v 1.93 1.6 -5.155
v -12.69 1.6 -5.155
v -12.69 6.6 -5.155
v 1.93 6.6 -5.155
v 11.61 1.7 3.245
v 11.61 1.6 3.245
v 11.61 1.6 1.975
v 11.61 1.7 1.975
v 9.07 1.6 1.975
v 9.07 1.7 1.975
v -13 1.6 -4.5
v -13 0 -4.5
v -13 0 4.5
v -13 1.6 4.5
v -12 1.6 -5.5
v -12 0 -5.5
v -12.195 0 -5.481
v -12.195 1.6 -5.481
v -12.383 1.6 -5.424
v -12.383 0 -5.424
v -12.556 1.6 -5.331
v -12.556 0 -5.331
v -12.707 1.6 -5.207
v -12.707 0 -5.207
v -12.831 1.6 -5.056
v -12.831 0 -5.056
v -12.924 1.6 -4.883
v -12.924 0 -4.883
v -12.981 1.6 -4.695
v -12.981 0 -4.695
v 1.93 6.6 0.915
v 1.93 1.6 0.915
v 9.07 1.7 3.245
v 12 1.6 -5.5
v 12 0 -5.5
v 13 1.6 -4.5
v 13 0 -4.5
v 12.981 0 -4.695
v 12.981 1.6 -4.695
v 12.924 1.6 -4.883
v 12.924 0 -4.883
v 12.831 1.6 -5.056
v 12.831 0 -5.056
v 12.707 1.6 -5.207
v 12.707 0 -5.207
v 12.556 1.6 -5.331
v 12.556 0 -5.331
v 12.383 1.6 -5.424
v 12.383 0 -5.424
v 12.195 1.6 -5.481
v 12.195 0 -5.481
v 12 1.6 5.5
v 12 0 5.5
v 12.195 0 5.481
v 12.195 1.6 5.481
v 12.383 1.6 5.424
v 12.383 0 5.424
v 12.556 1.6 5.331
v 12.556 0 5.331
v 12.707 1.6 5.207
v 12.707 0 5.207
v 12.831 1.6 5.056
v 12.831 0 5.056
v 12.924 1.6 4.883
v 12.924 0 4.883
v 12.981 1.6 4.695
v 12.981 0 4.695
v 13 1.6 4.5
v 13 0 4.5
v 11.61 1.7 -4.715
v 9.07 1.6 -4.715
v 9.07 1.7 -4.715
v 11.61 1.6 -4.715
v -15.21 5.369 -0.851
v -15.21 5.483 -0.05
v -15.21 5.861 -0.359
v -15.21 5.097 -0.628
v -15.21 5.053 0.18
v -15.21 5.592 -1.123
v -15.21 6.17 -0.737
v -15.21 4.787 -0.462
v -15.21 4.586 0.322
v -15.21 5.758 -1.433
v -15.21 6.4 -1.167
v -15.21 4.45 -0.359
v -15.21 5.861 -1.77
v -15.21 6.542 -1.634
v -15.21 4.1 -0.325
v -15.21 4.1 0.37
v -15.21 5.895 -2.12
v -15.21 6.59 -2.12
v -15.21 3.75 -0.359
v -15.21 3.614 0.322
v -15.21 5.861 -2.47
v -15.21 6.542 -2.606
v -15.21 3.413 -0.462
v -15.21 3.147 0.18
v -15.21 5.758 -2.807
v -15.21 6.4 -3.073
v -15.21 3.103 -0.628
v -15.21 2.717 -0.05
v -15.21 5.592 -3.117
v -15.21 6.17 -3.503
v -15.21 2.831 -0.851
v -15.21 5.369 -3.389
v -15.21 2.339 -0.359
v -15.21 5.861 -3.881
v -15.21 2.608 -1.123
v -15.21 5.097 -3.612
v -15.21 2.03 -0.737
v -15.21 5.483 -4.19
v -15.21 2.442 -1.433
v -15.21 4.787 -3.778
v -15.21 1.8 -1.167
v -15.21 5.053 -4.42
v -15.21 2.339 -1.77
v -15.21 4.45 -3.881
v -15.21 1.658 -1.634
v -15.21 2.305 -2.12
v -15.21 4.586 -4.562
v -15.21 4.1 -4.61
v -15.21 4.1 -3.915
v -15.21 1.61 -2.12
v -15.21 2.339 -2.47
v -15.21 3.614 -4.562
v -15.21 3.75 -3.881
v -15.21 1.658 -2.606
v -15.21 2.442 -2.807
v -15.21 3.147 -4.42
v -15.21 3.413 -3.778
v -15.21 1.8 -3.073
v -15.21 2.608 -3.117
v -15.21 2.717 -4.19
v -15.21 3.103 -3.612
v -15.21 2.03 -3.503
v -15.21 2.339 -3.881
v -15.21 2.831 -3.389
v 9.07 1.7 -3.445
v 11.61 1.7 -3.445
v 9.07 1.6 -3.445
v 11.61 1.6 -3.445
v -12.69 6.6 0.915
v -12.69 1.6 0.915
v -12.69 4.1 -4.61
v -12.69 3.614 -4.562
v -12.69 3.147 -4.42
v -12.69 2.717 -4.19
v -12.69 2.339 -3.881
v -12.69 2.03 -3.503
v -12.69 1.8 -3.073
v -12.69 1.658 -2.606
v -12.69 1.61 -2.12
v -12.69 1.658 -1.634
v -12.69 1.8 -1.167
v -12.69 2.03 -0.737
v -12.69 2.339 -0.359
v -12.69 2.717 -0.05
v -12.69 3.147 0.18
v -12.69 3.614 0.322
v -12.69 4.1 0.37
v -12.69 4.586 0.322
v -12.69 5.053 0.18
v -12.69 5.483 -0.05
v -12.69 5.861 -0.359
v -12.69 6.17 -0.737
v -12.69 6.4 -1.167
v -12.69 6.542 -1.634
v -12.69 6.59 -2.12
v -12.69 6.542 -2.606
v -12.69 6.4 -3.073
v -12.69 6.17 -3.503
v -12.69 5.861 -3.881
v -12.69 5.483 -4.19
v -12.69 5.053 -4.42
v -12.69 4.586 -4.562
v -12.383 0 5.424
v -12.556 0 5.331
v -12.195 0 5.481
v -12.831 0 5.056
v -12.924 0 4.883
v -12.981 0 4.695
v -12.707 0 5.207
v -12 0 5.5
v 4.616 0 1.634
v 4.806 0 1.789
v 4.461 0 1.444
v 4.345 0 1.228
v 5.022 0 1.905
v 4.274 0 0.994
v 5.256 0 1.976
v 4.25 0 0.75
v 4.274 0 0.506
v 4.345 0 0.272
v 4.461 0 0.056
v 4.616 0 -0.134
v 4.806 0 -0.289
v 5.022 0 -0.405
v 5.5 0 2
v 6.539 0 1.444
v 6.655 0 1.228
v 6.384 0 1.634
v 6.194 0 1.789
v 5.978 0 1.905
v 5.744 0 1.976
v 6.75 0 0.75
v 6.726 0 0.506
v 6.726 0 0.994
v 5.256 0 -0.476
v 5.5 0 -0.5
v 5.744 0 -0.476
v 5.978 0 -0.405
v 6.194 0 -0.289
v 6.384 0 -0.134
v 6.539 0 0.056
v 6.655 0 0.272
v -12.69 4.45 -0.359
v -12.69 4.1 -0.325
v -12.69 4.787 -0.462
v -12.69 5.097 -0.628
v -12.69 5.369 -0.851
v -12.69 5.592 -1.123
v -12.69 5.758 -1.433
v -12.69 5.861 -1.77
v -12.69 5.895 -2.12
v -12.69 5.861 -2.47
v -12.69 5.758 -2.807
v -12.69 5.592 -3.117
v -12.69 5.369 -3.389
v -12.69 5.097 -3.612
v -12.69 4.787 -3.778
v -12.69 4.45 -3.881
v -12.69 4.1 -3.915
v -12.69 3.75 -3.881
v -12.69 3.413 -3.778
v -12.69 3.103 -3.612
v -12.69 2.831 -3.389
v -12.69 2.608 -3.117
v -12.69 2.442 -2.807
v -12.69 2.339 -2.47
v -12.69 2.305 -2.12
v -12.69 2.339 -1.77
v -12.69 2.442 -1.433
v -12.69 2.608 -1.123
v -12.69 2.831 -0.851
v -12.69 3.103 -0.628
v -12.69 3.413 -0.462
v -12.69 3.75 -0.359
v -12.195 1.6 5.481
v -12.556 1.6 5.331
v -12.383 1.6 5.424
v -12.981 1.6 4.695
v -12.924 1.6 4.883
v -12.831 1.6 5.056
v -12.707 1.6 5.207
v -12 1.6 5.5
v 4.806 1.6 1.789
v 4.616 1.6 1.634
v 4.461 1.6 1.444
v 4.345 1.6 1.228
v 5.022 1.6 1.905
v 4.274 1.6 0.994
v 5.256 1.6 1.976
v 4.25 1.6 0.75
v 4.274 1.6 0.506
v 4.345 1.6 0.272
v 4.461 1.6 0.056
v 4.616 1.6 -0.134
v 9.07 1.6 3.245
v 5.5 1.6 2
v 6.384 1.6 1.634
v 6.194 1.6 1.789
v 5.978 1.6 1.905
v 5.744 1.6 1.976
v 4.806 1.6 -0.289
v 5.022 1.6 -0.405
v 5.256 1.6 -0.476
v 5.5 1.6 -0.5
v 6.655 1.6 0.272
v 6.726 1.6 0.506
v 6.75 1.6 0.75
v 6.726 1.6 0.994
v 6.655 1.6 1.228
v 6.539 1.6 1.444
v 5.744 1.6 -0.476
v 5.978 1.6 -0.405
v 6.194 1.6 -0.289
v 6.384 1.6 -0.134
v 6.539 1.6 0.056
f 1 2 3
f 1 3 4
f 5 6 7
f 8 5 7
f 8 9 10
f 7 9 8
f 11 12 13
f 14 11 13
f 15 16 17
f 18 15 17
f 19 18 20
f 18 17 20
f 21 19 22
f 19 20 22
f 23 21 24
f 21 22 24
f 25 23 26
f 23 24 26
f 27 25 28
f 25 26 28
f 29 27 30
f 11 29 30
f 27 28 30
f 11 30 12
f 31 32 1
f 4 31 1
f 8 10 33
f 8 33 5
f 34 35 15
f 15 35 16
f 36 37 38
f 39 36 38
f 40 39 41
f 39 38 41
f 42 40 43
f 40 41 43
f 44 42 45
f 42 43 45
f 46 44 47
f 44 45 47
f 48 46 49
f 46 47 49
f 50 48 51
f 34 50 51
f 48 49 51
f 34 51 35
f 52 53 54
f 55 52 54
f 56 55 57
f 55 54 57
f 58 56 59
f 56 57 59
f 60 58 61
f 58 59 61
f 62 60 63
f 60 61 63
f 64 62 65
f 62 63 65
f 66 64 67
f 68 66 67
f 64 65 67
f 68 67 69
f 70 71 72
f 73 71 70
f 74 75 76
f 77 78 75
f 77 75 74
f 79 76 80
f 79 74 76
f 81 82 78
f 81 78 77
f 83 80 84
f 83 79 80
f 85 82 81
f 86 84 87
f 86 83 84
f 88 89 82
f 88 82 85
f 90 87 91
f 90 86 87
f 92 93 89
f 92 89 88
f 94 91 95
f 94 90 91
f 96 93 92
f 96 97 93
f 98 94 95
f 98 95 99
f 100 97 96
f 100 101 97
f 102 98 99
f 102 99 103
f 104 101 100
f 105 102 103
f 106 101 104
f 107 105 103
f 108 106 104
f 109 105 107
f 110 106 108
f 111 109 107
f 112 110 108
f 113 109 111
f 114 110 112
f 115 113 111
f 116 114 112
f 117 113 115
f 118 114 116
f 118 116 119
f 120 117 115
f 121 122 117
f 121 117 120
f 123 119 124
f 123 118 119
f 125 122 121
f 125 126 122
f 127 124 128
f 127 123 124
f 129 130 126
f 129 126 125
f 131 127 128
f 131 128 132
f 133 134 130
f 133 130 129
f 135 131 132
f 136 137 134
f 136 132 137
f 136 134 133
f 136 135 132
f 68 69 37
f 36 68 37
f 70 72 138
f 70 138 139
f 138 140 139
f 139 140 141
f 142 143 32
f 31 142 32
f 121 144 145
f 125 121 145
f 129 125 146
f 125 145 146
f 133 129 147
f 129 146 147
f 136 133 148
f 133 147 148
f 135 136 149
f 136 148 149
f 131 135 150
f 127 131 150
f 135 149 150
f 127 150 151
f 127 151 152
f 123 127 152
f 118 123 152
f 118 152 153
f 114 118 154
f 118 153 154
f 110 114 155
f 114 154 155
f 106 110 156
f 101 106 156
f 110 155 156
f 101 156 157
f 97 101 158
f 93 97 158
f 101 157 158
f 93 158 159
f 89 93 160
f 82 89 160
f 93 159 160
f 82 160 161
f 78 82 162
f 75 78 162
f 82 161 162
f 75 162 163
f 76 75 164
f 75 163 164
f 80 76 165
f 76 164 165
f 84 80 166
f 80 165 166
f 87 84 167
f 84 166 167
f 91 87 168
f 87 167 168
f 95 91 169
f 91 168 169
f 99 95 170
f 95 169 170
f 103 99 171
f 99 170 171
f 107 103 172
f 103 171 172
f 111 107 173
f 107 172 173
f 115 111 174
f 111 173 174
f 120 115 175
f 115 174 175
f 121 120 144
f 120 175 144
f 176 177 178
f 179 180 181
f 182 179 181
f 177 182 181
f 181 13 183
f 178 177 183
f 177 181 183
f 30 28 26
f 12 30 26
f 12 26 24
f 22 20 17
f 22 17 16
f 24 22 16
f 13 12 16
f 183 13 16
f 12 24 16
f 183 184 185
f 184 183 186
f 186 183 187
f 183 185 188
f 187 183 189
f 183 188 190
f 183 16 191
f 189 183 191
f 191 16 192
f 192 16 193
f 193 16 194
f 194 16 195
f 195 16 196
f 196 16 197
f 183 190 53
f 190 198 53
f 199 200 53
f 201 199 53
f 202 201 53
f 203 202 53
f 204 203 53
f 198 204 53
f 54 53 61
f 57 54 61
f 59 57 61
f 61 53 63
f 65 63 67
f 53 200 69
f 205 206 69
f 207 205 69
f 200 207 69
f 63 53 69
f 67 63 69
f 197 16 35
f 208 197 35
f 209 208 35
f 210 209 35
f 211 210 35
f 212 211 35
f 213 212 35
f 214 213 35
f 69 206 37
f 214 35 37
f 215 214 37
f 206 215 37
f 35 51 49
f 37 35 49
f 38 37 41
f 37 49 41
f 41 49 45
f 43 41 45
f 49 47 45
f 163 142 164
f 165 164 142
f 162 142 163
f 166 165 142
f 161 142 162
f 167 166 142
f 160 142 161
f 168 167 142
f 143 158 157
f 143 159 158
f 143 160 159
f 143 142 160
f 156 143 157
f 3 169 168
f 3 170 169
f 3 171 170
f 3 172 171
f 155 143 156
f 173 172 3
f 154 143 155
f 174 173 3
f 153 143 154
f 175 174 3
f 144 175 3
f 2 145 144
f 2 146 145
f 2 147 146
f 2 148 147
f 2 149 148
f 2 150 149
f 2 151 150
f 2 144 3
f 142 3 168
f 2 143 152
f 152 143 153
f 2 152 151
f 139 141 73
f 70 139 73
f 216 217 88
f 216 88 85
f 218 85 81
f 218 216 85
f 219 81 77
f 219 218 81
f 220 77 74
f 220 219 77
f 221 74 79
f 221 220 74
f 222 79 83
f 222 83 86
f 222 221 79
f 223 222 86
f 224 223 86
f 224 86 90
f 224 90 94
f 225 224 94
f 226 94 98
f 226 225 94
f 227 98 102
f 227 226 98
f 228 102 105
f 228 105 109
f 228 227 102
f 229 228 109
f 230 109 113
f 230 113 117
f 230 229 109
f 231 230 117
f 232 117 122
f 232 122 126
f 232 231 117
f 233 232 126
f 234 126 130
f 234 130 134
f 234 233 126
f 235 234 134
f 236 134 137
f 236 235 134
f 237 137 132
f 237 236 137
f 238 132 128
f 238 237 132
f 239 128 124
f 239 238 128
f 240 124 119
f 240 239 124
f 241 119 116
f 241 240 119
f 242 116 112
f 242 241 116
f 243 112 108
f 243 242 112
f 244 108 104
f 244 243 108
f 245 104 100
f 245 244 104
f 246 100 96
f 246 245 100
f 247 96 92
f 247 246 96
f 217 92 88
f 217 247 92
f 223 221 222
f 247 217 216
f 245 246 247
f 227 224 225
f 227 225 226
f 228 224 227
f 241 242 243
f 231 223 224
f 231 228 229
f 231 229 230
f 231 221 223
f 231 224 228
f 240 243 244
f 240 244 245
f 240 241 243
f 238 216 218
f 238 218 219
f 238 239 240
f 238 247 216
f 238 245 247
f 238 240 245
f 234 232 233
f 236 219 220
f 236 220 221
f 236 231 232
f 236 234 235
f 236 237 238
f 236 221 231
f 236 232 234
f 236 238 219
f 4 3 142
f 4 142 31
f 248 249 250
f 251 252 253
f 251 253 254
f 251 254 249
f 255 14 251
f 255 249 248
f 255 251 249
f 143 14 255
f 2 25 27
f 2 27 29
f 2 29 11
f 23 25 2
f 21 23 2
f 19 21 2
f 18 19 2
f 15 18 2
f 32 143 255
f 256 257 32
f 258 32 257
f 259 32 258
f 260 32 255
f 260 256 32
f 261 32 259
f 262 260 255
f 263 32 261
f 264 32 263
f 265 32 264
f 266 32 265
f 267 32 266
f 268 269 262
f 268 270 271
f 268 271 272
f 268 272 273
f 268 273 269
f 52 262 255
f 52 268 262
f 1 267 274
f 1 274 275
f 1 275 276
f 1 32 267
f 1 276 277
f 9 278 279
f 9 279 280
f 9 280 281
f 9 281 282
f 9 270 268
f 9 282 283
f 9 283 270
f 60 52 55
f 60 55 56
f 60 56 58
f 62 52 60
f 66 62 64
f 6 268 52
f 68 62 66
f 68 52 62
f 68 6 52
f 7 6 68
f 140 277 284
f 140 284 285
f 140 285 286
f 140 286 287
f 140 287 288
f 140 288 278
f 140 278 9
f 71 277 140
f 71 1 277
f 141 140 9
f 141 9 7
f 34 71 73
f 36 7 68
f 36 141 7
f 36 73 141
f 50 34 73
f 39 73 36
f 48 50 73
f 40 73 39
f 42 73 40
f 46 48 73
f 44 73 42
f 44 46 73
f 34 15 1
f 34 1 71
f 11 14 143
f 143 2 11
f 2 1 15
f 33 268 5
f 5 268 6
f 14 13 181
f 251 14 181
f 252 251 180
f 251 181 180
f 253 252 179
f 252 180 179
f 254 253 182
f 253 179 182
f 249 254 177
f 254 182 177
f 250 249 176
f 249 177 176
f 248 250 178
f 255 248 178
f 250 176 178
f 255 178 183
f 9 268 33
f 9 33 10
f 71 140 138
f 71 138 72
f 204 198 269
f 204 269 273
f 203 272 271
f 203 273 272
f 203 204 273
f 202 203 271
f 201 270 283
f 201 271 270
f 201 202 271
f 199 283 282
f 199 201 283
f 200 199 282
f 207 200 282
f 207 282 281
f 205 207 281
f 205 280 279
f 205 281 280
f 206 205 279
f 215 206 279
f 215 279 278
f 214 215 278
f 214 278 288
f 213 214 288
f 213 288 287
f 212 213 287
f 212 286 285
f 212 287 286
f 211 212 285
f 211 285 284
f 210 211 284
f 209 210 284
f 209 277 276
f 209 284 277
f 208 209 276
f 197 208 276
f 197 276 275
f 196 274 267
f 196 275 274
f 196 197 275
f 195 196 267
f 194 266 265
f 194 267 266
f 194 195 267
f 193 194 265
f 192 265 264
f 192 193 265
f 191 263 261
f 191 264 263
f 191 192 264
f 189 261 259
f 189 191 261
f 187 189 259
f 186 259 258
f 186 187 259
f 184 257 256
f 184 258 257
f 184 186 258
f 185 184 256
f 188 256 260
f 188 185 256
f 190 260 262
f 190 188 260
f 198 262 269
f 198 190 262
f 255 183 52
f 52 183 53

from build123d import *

# Parameters (mm, degrees)
BOSS_EXTRUDE1_DEPTH     = 1.6
SKETCH2_W               = 2.54
SKETCH2_H               = 1.27
BOSS_EXTRUDE2_DEPTH     = 0.1
SKETCH3_W               = 14.62
SKETCH3_H               = 6.07
BOSS_EXTRUDE3_DEPTH     = 5
SKETCH4_R               = 2.49
SKETCH4_R_2             = 1.795
BOSS_EXTRUDE5_DEPTH     = 2.52
CUT_EXTRUDE1_DEPTH      = 17.929090348
CUT_EXTRUDE1_DEPTH_BACK = 17.929090348
SKETCH5_R               = 1.25


with BuildPart() as part:
    # Sketch1 → Boss-Extrude1 (new body)
    with BuildSketch(Plane(origin=(0, 0, 0), x_dir=(1, 0, 0), z_dir=(0, 1, 0))):
        with BuildLine():
            Line((12, 5.5), (-12, 5.5))
            ThreePointArc((-12, 5.5), (-12.707106781, 5.207106781), (-13, 4.5))
            Line((-13, 4.5), (-13, -4.5))
            ThreePointArc((-13, -4.5), (-12.707106781, -5.207106781), (-12, -5.5))
            Line((-12, -5.5), (12, -5.5))
            ThreePointArc((12, -5.5), (12.707106781, -5.207106781), (13, -4.5))
            Line((13, -4.5), (13, 4.5))
            ThreePointArc((13, 4.5), (12.707106781, 5.207106781), (12, 5.5))
        make_face()
    extrude(amount=BOSS_EXTRUDE1_DEPTH)

    # Sketch2 → Boss-Extrude2 (add)
    with BuildSketch(Plane(origin=(0, 1.6, 0), x_dir=(1, 0, 0), z_dir=(0, 1, 0))):
        with Locations((10.34, 4.08)):
            Rectangle(SKETCH2_W, SKETCH2_H)
        with Locations((10.34, -2.61)):
            Rectangle(SKETCH2_W, SKETCH2_H)
    extrude(amount=BOSS_EXTRUDE2_DEPTH)

    # Sketch3 → Boss-Extrude3 (add)
    with BuildSketch(Plane(origin=(0, 1.6, 0), x_dir=(1, 0, 0), z_dir=(0, 1, 0))):
        with Locations((-5.38, 2.12)):
            Rectangle(SKETCH3_W, SKETCH3_H)
    extrude(amount=BOSS_EXTRUDE3_DEPTH)

    # Sketch4 → Boss-Extrude5 (add)
    with BuildSketch(Plane.ZY.offset(12.69)):
        with Locations(Location((-2.12, 4.1, 0), (0, 0, 180))):
            Circle(SKETCH4_R)
        with Locations((-2.12, 4.1)):
            Circle(SKETCH4_R_2, mode=Mode.SUBTRACT)
    extrude(amount=BOSS_EXTRUDE5_DEPTH)

    # Sketch5 → Cut-Extrude1 (cut, two sides: drawn at the far end of the back side and taken through both)
    with BuildSketch(Plane(origin=(0, 1.6, 0), x_dir=(1, 0, 0), z_dir=(0, 1, 0)).offset(-CUT_EXTRUDE1_DEPTH_BACK)):
        with Locations(Location((5.5, -0.75, 0), (0, 0, 270))):
            Circle(SKETCH5_R)
    extrude(amount=CUT_EXTRUDE1_DEPTH + CUT_EXTRUDE1_DEPTH_BACK, mode=Mode.SUBTRACT)


solid = part.part
